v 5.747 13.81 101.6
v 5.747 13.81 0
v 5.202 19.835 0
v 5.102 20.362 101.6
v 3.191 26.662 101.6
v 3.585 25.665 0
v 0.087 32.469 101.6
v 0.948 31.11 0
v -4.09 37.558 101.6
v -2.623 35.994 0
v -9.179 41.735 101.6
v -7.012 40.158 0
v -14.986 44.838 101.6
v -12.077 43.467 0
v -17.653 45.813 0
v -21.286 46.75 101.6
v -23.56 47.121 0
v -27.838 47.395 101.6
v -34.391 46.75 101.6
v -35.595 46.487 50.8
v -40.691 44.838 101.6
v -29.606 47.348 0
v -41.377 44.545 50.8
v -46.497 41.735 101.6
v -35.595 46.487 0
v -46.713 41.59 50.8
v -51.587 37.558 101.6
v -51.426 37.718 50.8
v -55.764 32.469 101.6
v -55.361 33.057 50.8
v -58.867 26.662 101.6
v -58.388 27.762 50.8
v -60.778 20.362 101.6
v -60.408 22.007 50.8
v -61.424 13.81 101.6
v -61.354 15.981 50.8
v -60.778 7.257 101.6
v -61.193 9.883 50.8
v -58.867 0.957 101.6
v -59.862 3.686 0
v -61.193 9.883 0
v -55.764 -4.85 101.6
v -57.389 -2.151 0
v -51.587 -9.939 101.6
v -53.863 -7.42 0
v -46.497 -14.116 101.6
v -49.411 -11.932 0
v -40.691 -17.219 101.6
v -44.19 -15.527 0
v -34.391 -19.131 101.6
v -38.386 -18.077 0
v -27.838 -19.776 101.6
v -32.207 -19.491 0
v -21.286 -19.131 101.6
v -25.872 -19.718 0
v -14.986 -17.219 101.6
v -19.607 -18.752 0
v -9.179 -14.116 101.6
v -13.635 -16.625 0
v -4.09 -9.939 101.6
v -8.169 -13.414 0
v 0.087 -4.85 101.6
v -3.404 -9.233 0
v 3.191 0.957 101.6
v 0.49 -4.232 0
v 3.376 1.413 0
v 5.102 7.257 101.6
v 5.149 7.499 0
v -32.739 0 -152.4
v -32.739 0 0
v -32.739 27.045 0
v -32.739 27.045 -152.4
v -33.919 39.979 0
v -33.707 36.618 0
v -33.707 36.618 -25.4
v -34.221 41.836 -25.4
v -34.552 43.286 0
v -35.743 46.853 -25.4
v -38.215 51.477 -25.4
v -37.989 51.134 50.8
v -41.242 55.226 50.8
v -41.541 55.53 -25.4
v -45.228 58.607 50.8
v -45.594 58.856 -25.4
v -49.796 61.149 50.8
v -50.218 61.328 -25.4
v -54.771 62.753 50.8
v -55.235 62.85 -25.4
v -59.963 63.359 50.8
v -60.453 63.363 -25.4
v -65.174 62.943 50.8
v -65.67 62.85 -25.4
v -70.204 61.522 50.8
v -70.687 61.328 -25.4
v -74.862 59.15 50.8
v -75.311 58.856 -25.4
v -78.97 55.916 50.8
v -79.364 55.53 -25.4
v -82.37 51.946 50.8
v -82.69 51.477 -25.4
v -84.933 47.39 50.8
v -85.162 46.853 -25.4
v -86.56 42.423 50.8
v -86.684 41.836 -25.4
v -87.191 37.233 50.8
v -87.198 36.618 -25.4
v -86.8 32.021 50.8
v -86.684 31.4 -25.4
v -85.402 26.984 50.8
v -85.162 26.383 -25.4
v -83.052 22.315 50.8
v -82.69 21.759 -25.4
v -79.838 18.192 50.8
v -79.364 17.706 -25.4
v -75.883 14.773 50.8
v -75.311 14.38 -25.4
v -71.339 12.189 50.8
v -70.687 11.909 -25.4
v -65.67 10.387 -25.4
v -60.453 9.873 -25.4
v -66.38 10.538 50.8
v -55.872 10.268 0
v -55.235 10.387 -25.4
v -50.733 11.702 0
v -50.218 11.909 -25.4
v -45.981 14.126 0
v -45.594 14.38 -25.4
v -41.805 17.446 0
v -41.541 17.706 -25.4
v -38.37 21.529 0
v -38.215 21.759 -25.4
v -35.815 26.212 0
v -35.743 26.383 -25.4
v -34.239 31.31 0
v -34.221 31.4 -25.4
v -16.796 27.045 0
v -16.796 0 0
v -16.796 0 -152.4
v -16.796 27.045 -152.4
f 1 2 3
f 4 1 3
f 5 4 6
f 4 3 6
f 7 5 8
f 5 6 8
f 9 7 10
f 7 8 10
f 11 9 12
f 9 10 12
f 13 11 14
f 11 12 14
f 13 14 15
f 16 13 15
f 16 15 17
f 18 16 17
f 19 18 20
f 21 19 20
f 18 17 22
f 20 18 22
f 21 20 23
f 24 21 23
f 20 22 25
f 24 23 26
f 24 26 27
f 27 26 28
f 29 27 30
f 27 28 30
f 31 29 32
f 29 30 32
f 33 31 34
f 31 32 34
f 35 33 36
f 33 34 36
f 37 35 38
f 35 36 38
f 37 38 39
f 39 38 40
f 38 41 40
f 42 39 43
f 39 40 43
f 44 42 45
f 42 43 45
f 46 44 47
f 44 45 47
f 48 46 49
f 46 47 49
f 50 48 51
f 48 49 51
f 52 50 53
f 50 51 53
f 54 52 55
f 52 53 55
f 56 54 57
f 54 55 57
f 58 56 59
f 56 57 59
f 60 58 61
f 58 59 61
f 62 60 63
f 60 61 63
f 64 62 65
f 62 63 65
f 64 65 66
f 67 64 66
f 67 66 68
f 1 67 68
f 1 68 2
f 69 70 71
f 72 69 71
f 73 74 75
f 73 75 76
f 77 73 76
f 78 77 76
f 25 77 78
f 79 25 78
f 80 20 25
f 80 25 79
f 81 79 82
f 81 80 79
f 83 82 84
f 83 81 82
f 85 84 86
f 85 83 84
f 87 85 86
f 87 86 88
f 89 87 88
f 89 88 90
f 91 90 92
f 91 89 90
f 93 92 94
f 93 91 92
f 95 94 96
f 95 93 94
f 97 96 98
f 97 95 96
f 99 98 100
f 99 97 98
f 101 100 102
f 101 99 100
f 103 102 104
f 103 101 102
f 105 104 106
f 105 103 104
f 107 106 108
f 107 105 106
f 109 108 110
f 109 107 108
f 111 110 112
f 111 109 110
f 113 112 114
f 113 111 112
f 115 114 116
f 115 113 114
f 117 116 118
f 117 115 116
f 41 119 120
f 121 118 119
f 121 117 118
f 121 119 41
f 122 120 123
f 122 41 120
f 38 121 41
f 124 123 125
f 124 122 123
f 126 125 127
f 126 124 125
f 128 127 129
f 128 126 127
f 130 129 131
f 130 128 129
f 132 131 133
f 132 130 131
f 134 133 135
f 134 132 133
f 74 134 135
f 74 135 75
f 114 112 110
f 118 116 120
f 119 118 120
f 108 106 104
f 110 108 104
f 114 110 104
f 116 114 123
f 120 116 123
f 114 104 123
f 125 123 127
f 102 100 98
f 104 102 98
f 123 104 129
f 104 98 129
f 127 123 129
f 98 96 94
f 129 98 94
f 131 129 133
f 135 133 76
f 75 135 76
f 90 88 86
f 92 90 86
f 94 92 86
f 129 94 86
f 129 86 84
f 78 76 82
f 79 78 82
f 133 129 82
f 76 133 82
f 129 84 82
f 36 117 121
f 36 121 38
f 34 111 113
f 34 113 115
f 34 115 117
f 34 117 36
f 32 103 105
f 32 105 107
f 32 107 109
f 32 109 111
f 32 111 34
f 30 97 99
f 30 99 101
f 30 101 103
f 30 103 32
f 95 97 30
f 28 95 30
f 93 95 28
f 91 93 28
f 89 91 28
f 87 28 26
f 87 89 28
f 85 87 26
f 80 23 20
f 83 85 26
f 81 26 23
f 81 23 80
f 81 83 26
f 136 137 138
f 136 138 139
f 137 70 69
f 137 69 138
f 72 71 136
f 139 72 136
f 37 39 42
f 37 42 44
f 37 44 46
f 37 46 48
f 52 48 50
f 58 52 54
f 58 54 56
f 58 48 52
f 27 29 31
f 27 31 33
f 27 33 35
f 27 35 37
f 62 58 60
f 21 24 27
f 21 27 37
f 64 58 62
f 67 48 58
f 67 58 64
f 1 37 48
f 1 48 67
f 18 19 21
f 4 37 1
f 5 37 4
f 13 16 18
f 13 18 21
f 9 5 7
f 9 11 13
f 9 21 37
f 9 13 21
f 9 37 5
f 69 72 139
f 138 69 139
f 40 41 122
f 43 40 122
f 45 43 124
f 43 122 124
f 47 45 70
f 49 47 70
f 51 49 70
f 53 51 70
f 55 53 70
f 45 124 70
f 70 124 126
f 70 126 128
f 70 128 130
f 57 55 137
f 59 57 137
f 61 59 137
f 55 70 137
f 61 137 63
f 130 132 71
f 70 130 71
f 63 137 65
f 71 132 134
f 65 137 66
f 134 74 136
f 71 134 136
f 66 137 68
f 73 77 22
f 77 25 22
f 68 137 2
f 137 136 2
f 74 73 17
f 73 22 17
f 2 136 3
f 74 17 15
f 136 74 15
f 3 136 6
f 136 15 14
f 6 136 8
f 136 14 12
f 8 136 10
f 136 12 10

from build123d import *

# Parameters (mm, degrees)
F0_R     = 26.745197
F1_DEPTH = 50.8
F2_R     = 33.58545
F3_DEPTH = 101.6
F4_DEPTH = 50.8
F5_DEPTH = 25.4
F6_W     = 15.942245
F6_H     = 27.044877
F7_DEPTH = 152.4


with BuildPart() as f1:
    # F0 (on Top) → F1 (new body)
    with BuildSketch(Plane.XY):
        with Locations((-60.452543, 36.618207)):
            Circle(F0_R)
    extrude(amount=F1_DEPTH)

    # F2 (on Top) → F3 (join)
    with BuildSketch(Plane.XY):
        with Locations((-27.838308, 13.809561)):
            Circle(F2_R)
    extrude(amount=F3_DEPTH)

    # F0 (on Top) → F4 (join)
    with BuildSketch(Plane.XY):
        with Locations((-60.452543, 36.618207)):
            Circle(F0_R)
    extrude(amount=F4_DEPTH)

    # F0 (on Top) → F5 (join)
    with BuildSketch(Plane.XY):
        with Locations((-60.452543, 36.618207)):
            Circle(F0_R)
    extrude(amount=-F5_DEPTH)

    # F6 (on Top) → F7 (join)
    with BuildSketch(Plane.XY):
        with Locations((-24.767418, 13.522438)):
            Rectangle(F6_W, F6_H)
    extrude(amount=-F7_DEPTH)


solid = f1.part
